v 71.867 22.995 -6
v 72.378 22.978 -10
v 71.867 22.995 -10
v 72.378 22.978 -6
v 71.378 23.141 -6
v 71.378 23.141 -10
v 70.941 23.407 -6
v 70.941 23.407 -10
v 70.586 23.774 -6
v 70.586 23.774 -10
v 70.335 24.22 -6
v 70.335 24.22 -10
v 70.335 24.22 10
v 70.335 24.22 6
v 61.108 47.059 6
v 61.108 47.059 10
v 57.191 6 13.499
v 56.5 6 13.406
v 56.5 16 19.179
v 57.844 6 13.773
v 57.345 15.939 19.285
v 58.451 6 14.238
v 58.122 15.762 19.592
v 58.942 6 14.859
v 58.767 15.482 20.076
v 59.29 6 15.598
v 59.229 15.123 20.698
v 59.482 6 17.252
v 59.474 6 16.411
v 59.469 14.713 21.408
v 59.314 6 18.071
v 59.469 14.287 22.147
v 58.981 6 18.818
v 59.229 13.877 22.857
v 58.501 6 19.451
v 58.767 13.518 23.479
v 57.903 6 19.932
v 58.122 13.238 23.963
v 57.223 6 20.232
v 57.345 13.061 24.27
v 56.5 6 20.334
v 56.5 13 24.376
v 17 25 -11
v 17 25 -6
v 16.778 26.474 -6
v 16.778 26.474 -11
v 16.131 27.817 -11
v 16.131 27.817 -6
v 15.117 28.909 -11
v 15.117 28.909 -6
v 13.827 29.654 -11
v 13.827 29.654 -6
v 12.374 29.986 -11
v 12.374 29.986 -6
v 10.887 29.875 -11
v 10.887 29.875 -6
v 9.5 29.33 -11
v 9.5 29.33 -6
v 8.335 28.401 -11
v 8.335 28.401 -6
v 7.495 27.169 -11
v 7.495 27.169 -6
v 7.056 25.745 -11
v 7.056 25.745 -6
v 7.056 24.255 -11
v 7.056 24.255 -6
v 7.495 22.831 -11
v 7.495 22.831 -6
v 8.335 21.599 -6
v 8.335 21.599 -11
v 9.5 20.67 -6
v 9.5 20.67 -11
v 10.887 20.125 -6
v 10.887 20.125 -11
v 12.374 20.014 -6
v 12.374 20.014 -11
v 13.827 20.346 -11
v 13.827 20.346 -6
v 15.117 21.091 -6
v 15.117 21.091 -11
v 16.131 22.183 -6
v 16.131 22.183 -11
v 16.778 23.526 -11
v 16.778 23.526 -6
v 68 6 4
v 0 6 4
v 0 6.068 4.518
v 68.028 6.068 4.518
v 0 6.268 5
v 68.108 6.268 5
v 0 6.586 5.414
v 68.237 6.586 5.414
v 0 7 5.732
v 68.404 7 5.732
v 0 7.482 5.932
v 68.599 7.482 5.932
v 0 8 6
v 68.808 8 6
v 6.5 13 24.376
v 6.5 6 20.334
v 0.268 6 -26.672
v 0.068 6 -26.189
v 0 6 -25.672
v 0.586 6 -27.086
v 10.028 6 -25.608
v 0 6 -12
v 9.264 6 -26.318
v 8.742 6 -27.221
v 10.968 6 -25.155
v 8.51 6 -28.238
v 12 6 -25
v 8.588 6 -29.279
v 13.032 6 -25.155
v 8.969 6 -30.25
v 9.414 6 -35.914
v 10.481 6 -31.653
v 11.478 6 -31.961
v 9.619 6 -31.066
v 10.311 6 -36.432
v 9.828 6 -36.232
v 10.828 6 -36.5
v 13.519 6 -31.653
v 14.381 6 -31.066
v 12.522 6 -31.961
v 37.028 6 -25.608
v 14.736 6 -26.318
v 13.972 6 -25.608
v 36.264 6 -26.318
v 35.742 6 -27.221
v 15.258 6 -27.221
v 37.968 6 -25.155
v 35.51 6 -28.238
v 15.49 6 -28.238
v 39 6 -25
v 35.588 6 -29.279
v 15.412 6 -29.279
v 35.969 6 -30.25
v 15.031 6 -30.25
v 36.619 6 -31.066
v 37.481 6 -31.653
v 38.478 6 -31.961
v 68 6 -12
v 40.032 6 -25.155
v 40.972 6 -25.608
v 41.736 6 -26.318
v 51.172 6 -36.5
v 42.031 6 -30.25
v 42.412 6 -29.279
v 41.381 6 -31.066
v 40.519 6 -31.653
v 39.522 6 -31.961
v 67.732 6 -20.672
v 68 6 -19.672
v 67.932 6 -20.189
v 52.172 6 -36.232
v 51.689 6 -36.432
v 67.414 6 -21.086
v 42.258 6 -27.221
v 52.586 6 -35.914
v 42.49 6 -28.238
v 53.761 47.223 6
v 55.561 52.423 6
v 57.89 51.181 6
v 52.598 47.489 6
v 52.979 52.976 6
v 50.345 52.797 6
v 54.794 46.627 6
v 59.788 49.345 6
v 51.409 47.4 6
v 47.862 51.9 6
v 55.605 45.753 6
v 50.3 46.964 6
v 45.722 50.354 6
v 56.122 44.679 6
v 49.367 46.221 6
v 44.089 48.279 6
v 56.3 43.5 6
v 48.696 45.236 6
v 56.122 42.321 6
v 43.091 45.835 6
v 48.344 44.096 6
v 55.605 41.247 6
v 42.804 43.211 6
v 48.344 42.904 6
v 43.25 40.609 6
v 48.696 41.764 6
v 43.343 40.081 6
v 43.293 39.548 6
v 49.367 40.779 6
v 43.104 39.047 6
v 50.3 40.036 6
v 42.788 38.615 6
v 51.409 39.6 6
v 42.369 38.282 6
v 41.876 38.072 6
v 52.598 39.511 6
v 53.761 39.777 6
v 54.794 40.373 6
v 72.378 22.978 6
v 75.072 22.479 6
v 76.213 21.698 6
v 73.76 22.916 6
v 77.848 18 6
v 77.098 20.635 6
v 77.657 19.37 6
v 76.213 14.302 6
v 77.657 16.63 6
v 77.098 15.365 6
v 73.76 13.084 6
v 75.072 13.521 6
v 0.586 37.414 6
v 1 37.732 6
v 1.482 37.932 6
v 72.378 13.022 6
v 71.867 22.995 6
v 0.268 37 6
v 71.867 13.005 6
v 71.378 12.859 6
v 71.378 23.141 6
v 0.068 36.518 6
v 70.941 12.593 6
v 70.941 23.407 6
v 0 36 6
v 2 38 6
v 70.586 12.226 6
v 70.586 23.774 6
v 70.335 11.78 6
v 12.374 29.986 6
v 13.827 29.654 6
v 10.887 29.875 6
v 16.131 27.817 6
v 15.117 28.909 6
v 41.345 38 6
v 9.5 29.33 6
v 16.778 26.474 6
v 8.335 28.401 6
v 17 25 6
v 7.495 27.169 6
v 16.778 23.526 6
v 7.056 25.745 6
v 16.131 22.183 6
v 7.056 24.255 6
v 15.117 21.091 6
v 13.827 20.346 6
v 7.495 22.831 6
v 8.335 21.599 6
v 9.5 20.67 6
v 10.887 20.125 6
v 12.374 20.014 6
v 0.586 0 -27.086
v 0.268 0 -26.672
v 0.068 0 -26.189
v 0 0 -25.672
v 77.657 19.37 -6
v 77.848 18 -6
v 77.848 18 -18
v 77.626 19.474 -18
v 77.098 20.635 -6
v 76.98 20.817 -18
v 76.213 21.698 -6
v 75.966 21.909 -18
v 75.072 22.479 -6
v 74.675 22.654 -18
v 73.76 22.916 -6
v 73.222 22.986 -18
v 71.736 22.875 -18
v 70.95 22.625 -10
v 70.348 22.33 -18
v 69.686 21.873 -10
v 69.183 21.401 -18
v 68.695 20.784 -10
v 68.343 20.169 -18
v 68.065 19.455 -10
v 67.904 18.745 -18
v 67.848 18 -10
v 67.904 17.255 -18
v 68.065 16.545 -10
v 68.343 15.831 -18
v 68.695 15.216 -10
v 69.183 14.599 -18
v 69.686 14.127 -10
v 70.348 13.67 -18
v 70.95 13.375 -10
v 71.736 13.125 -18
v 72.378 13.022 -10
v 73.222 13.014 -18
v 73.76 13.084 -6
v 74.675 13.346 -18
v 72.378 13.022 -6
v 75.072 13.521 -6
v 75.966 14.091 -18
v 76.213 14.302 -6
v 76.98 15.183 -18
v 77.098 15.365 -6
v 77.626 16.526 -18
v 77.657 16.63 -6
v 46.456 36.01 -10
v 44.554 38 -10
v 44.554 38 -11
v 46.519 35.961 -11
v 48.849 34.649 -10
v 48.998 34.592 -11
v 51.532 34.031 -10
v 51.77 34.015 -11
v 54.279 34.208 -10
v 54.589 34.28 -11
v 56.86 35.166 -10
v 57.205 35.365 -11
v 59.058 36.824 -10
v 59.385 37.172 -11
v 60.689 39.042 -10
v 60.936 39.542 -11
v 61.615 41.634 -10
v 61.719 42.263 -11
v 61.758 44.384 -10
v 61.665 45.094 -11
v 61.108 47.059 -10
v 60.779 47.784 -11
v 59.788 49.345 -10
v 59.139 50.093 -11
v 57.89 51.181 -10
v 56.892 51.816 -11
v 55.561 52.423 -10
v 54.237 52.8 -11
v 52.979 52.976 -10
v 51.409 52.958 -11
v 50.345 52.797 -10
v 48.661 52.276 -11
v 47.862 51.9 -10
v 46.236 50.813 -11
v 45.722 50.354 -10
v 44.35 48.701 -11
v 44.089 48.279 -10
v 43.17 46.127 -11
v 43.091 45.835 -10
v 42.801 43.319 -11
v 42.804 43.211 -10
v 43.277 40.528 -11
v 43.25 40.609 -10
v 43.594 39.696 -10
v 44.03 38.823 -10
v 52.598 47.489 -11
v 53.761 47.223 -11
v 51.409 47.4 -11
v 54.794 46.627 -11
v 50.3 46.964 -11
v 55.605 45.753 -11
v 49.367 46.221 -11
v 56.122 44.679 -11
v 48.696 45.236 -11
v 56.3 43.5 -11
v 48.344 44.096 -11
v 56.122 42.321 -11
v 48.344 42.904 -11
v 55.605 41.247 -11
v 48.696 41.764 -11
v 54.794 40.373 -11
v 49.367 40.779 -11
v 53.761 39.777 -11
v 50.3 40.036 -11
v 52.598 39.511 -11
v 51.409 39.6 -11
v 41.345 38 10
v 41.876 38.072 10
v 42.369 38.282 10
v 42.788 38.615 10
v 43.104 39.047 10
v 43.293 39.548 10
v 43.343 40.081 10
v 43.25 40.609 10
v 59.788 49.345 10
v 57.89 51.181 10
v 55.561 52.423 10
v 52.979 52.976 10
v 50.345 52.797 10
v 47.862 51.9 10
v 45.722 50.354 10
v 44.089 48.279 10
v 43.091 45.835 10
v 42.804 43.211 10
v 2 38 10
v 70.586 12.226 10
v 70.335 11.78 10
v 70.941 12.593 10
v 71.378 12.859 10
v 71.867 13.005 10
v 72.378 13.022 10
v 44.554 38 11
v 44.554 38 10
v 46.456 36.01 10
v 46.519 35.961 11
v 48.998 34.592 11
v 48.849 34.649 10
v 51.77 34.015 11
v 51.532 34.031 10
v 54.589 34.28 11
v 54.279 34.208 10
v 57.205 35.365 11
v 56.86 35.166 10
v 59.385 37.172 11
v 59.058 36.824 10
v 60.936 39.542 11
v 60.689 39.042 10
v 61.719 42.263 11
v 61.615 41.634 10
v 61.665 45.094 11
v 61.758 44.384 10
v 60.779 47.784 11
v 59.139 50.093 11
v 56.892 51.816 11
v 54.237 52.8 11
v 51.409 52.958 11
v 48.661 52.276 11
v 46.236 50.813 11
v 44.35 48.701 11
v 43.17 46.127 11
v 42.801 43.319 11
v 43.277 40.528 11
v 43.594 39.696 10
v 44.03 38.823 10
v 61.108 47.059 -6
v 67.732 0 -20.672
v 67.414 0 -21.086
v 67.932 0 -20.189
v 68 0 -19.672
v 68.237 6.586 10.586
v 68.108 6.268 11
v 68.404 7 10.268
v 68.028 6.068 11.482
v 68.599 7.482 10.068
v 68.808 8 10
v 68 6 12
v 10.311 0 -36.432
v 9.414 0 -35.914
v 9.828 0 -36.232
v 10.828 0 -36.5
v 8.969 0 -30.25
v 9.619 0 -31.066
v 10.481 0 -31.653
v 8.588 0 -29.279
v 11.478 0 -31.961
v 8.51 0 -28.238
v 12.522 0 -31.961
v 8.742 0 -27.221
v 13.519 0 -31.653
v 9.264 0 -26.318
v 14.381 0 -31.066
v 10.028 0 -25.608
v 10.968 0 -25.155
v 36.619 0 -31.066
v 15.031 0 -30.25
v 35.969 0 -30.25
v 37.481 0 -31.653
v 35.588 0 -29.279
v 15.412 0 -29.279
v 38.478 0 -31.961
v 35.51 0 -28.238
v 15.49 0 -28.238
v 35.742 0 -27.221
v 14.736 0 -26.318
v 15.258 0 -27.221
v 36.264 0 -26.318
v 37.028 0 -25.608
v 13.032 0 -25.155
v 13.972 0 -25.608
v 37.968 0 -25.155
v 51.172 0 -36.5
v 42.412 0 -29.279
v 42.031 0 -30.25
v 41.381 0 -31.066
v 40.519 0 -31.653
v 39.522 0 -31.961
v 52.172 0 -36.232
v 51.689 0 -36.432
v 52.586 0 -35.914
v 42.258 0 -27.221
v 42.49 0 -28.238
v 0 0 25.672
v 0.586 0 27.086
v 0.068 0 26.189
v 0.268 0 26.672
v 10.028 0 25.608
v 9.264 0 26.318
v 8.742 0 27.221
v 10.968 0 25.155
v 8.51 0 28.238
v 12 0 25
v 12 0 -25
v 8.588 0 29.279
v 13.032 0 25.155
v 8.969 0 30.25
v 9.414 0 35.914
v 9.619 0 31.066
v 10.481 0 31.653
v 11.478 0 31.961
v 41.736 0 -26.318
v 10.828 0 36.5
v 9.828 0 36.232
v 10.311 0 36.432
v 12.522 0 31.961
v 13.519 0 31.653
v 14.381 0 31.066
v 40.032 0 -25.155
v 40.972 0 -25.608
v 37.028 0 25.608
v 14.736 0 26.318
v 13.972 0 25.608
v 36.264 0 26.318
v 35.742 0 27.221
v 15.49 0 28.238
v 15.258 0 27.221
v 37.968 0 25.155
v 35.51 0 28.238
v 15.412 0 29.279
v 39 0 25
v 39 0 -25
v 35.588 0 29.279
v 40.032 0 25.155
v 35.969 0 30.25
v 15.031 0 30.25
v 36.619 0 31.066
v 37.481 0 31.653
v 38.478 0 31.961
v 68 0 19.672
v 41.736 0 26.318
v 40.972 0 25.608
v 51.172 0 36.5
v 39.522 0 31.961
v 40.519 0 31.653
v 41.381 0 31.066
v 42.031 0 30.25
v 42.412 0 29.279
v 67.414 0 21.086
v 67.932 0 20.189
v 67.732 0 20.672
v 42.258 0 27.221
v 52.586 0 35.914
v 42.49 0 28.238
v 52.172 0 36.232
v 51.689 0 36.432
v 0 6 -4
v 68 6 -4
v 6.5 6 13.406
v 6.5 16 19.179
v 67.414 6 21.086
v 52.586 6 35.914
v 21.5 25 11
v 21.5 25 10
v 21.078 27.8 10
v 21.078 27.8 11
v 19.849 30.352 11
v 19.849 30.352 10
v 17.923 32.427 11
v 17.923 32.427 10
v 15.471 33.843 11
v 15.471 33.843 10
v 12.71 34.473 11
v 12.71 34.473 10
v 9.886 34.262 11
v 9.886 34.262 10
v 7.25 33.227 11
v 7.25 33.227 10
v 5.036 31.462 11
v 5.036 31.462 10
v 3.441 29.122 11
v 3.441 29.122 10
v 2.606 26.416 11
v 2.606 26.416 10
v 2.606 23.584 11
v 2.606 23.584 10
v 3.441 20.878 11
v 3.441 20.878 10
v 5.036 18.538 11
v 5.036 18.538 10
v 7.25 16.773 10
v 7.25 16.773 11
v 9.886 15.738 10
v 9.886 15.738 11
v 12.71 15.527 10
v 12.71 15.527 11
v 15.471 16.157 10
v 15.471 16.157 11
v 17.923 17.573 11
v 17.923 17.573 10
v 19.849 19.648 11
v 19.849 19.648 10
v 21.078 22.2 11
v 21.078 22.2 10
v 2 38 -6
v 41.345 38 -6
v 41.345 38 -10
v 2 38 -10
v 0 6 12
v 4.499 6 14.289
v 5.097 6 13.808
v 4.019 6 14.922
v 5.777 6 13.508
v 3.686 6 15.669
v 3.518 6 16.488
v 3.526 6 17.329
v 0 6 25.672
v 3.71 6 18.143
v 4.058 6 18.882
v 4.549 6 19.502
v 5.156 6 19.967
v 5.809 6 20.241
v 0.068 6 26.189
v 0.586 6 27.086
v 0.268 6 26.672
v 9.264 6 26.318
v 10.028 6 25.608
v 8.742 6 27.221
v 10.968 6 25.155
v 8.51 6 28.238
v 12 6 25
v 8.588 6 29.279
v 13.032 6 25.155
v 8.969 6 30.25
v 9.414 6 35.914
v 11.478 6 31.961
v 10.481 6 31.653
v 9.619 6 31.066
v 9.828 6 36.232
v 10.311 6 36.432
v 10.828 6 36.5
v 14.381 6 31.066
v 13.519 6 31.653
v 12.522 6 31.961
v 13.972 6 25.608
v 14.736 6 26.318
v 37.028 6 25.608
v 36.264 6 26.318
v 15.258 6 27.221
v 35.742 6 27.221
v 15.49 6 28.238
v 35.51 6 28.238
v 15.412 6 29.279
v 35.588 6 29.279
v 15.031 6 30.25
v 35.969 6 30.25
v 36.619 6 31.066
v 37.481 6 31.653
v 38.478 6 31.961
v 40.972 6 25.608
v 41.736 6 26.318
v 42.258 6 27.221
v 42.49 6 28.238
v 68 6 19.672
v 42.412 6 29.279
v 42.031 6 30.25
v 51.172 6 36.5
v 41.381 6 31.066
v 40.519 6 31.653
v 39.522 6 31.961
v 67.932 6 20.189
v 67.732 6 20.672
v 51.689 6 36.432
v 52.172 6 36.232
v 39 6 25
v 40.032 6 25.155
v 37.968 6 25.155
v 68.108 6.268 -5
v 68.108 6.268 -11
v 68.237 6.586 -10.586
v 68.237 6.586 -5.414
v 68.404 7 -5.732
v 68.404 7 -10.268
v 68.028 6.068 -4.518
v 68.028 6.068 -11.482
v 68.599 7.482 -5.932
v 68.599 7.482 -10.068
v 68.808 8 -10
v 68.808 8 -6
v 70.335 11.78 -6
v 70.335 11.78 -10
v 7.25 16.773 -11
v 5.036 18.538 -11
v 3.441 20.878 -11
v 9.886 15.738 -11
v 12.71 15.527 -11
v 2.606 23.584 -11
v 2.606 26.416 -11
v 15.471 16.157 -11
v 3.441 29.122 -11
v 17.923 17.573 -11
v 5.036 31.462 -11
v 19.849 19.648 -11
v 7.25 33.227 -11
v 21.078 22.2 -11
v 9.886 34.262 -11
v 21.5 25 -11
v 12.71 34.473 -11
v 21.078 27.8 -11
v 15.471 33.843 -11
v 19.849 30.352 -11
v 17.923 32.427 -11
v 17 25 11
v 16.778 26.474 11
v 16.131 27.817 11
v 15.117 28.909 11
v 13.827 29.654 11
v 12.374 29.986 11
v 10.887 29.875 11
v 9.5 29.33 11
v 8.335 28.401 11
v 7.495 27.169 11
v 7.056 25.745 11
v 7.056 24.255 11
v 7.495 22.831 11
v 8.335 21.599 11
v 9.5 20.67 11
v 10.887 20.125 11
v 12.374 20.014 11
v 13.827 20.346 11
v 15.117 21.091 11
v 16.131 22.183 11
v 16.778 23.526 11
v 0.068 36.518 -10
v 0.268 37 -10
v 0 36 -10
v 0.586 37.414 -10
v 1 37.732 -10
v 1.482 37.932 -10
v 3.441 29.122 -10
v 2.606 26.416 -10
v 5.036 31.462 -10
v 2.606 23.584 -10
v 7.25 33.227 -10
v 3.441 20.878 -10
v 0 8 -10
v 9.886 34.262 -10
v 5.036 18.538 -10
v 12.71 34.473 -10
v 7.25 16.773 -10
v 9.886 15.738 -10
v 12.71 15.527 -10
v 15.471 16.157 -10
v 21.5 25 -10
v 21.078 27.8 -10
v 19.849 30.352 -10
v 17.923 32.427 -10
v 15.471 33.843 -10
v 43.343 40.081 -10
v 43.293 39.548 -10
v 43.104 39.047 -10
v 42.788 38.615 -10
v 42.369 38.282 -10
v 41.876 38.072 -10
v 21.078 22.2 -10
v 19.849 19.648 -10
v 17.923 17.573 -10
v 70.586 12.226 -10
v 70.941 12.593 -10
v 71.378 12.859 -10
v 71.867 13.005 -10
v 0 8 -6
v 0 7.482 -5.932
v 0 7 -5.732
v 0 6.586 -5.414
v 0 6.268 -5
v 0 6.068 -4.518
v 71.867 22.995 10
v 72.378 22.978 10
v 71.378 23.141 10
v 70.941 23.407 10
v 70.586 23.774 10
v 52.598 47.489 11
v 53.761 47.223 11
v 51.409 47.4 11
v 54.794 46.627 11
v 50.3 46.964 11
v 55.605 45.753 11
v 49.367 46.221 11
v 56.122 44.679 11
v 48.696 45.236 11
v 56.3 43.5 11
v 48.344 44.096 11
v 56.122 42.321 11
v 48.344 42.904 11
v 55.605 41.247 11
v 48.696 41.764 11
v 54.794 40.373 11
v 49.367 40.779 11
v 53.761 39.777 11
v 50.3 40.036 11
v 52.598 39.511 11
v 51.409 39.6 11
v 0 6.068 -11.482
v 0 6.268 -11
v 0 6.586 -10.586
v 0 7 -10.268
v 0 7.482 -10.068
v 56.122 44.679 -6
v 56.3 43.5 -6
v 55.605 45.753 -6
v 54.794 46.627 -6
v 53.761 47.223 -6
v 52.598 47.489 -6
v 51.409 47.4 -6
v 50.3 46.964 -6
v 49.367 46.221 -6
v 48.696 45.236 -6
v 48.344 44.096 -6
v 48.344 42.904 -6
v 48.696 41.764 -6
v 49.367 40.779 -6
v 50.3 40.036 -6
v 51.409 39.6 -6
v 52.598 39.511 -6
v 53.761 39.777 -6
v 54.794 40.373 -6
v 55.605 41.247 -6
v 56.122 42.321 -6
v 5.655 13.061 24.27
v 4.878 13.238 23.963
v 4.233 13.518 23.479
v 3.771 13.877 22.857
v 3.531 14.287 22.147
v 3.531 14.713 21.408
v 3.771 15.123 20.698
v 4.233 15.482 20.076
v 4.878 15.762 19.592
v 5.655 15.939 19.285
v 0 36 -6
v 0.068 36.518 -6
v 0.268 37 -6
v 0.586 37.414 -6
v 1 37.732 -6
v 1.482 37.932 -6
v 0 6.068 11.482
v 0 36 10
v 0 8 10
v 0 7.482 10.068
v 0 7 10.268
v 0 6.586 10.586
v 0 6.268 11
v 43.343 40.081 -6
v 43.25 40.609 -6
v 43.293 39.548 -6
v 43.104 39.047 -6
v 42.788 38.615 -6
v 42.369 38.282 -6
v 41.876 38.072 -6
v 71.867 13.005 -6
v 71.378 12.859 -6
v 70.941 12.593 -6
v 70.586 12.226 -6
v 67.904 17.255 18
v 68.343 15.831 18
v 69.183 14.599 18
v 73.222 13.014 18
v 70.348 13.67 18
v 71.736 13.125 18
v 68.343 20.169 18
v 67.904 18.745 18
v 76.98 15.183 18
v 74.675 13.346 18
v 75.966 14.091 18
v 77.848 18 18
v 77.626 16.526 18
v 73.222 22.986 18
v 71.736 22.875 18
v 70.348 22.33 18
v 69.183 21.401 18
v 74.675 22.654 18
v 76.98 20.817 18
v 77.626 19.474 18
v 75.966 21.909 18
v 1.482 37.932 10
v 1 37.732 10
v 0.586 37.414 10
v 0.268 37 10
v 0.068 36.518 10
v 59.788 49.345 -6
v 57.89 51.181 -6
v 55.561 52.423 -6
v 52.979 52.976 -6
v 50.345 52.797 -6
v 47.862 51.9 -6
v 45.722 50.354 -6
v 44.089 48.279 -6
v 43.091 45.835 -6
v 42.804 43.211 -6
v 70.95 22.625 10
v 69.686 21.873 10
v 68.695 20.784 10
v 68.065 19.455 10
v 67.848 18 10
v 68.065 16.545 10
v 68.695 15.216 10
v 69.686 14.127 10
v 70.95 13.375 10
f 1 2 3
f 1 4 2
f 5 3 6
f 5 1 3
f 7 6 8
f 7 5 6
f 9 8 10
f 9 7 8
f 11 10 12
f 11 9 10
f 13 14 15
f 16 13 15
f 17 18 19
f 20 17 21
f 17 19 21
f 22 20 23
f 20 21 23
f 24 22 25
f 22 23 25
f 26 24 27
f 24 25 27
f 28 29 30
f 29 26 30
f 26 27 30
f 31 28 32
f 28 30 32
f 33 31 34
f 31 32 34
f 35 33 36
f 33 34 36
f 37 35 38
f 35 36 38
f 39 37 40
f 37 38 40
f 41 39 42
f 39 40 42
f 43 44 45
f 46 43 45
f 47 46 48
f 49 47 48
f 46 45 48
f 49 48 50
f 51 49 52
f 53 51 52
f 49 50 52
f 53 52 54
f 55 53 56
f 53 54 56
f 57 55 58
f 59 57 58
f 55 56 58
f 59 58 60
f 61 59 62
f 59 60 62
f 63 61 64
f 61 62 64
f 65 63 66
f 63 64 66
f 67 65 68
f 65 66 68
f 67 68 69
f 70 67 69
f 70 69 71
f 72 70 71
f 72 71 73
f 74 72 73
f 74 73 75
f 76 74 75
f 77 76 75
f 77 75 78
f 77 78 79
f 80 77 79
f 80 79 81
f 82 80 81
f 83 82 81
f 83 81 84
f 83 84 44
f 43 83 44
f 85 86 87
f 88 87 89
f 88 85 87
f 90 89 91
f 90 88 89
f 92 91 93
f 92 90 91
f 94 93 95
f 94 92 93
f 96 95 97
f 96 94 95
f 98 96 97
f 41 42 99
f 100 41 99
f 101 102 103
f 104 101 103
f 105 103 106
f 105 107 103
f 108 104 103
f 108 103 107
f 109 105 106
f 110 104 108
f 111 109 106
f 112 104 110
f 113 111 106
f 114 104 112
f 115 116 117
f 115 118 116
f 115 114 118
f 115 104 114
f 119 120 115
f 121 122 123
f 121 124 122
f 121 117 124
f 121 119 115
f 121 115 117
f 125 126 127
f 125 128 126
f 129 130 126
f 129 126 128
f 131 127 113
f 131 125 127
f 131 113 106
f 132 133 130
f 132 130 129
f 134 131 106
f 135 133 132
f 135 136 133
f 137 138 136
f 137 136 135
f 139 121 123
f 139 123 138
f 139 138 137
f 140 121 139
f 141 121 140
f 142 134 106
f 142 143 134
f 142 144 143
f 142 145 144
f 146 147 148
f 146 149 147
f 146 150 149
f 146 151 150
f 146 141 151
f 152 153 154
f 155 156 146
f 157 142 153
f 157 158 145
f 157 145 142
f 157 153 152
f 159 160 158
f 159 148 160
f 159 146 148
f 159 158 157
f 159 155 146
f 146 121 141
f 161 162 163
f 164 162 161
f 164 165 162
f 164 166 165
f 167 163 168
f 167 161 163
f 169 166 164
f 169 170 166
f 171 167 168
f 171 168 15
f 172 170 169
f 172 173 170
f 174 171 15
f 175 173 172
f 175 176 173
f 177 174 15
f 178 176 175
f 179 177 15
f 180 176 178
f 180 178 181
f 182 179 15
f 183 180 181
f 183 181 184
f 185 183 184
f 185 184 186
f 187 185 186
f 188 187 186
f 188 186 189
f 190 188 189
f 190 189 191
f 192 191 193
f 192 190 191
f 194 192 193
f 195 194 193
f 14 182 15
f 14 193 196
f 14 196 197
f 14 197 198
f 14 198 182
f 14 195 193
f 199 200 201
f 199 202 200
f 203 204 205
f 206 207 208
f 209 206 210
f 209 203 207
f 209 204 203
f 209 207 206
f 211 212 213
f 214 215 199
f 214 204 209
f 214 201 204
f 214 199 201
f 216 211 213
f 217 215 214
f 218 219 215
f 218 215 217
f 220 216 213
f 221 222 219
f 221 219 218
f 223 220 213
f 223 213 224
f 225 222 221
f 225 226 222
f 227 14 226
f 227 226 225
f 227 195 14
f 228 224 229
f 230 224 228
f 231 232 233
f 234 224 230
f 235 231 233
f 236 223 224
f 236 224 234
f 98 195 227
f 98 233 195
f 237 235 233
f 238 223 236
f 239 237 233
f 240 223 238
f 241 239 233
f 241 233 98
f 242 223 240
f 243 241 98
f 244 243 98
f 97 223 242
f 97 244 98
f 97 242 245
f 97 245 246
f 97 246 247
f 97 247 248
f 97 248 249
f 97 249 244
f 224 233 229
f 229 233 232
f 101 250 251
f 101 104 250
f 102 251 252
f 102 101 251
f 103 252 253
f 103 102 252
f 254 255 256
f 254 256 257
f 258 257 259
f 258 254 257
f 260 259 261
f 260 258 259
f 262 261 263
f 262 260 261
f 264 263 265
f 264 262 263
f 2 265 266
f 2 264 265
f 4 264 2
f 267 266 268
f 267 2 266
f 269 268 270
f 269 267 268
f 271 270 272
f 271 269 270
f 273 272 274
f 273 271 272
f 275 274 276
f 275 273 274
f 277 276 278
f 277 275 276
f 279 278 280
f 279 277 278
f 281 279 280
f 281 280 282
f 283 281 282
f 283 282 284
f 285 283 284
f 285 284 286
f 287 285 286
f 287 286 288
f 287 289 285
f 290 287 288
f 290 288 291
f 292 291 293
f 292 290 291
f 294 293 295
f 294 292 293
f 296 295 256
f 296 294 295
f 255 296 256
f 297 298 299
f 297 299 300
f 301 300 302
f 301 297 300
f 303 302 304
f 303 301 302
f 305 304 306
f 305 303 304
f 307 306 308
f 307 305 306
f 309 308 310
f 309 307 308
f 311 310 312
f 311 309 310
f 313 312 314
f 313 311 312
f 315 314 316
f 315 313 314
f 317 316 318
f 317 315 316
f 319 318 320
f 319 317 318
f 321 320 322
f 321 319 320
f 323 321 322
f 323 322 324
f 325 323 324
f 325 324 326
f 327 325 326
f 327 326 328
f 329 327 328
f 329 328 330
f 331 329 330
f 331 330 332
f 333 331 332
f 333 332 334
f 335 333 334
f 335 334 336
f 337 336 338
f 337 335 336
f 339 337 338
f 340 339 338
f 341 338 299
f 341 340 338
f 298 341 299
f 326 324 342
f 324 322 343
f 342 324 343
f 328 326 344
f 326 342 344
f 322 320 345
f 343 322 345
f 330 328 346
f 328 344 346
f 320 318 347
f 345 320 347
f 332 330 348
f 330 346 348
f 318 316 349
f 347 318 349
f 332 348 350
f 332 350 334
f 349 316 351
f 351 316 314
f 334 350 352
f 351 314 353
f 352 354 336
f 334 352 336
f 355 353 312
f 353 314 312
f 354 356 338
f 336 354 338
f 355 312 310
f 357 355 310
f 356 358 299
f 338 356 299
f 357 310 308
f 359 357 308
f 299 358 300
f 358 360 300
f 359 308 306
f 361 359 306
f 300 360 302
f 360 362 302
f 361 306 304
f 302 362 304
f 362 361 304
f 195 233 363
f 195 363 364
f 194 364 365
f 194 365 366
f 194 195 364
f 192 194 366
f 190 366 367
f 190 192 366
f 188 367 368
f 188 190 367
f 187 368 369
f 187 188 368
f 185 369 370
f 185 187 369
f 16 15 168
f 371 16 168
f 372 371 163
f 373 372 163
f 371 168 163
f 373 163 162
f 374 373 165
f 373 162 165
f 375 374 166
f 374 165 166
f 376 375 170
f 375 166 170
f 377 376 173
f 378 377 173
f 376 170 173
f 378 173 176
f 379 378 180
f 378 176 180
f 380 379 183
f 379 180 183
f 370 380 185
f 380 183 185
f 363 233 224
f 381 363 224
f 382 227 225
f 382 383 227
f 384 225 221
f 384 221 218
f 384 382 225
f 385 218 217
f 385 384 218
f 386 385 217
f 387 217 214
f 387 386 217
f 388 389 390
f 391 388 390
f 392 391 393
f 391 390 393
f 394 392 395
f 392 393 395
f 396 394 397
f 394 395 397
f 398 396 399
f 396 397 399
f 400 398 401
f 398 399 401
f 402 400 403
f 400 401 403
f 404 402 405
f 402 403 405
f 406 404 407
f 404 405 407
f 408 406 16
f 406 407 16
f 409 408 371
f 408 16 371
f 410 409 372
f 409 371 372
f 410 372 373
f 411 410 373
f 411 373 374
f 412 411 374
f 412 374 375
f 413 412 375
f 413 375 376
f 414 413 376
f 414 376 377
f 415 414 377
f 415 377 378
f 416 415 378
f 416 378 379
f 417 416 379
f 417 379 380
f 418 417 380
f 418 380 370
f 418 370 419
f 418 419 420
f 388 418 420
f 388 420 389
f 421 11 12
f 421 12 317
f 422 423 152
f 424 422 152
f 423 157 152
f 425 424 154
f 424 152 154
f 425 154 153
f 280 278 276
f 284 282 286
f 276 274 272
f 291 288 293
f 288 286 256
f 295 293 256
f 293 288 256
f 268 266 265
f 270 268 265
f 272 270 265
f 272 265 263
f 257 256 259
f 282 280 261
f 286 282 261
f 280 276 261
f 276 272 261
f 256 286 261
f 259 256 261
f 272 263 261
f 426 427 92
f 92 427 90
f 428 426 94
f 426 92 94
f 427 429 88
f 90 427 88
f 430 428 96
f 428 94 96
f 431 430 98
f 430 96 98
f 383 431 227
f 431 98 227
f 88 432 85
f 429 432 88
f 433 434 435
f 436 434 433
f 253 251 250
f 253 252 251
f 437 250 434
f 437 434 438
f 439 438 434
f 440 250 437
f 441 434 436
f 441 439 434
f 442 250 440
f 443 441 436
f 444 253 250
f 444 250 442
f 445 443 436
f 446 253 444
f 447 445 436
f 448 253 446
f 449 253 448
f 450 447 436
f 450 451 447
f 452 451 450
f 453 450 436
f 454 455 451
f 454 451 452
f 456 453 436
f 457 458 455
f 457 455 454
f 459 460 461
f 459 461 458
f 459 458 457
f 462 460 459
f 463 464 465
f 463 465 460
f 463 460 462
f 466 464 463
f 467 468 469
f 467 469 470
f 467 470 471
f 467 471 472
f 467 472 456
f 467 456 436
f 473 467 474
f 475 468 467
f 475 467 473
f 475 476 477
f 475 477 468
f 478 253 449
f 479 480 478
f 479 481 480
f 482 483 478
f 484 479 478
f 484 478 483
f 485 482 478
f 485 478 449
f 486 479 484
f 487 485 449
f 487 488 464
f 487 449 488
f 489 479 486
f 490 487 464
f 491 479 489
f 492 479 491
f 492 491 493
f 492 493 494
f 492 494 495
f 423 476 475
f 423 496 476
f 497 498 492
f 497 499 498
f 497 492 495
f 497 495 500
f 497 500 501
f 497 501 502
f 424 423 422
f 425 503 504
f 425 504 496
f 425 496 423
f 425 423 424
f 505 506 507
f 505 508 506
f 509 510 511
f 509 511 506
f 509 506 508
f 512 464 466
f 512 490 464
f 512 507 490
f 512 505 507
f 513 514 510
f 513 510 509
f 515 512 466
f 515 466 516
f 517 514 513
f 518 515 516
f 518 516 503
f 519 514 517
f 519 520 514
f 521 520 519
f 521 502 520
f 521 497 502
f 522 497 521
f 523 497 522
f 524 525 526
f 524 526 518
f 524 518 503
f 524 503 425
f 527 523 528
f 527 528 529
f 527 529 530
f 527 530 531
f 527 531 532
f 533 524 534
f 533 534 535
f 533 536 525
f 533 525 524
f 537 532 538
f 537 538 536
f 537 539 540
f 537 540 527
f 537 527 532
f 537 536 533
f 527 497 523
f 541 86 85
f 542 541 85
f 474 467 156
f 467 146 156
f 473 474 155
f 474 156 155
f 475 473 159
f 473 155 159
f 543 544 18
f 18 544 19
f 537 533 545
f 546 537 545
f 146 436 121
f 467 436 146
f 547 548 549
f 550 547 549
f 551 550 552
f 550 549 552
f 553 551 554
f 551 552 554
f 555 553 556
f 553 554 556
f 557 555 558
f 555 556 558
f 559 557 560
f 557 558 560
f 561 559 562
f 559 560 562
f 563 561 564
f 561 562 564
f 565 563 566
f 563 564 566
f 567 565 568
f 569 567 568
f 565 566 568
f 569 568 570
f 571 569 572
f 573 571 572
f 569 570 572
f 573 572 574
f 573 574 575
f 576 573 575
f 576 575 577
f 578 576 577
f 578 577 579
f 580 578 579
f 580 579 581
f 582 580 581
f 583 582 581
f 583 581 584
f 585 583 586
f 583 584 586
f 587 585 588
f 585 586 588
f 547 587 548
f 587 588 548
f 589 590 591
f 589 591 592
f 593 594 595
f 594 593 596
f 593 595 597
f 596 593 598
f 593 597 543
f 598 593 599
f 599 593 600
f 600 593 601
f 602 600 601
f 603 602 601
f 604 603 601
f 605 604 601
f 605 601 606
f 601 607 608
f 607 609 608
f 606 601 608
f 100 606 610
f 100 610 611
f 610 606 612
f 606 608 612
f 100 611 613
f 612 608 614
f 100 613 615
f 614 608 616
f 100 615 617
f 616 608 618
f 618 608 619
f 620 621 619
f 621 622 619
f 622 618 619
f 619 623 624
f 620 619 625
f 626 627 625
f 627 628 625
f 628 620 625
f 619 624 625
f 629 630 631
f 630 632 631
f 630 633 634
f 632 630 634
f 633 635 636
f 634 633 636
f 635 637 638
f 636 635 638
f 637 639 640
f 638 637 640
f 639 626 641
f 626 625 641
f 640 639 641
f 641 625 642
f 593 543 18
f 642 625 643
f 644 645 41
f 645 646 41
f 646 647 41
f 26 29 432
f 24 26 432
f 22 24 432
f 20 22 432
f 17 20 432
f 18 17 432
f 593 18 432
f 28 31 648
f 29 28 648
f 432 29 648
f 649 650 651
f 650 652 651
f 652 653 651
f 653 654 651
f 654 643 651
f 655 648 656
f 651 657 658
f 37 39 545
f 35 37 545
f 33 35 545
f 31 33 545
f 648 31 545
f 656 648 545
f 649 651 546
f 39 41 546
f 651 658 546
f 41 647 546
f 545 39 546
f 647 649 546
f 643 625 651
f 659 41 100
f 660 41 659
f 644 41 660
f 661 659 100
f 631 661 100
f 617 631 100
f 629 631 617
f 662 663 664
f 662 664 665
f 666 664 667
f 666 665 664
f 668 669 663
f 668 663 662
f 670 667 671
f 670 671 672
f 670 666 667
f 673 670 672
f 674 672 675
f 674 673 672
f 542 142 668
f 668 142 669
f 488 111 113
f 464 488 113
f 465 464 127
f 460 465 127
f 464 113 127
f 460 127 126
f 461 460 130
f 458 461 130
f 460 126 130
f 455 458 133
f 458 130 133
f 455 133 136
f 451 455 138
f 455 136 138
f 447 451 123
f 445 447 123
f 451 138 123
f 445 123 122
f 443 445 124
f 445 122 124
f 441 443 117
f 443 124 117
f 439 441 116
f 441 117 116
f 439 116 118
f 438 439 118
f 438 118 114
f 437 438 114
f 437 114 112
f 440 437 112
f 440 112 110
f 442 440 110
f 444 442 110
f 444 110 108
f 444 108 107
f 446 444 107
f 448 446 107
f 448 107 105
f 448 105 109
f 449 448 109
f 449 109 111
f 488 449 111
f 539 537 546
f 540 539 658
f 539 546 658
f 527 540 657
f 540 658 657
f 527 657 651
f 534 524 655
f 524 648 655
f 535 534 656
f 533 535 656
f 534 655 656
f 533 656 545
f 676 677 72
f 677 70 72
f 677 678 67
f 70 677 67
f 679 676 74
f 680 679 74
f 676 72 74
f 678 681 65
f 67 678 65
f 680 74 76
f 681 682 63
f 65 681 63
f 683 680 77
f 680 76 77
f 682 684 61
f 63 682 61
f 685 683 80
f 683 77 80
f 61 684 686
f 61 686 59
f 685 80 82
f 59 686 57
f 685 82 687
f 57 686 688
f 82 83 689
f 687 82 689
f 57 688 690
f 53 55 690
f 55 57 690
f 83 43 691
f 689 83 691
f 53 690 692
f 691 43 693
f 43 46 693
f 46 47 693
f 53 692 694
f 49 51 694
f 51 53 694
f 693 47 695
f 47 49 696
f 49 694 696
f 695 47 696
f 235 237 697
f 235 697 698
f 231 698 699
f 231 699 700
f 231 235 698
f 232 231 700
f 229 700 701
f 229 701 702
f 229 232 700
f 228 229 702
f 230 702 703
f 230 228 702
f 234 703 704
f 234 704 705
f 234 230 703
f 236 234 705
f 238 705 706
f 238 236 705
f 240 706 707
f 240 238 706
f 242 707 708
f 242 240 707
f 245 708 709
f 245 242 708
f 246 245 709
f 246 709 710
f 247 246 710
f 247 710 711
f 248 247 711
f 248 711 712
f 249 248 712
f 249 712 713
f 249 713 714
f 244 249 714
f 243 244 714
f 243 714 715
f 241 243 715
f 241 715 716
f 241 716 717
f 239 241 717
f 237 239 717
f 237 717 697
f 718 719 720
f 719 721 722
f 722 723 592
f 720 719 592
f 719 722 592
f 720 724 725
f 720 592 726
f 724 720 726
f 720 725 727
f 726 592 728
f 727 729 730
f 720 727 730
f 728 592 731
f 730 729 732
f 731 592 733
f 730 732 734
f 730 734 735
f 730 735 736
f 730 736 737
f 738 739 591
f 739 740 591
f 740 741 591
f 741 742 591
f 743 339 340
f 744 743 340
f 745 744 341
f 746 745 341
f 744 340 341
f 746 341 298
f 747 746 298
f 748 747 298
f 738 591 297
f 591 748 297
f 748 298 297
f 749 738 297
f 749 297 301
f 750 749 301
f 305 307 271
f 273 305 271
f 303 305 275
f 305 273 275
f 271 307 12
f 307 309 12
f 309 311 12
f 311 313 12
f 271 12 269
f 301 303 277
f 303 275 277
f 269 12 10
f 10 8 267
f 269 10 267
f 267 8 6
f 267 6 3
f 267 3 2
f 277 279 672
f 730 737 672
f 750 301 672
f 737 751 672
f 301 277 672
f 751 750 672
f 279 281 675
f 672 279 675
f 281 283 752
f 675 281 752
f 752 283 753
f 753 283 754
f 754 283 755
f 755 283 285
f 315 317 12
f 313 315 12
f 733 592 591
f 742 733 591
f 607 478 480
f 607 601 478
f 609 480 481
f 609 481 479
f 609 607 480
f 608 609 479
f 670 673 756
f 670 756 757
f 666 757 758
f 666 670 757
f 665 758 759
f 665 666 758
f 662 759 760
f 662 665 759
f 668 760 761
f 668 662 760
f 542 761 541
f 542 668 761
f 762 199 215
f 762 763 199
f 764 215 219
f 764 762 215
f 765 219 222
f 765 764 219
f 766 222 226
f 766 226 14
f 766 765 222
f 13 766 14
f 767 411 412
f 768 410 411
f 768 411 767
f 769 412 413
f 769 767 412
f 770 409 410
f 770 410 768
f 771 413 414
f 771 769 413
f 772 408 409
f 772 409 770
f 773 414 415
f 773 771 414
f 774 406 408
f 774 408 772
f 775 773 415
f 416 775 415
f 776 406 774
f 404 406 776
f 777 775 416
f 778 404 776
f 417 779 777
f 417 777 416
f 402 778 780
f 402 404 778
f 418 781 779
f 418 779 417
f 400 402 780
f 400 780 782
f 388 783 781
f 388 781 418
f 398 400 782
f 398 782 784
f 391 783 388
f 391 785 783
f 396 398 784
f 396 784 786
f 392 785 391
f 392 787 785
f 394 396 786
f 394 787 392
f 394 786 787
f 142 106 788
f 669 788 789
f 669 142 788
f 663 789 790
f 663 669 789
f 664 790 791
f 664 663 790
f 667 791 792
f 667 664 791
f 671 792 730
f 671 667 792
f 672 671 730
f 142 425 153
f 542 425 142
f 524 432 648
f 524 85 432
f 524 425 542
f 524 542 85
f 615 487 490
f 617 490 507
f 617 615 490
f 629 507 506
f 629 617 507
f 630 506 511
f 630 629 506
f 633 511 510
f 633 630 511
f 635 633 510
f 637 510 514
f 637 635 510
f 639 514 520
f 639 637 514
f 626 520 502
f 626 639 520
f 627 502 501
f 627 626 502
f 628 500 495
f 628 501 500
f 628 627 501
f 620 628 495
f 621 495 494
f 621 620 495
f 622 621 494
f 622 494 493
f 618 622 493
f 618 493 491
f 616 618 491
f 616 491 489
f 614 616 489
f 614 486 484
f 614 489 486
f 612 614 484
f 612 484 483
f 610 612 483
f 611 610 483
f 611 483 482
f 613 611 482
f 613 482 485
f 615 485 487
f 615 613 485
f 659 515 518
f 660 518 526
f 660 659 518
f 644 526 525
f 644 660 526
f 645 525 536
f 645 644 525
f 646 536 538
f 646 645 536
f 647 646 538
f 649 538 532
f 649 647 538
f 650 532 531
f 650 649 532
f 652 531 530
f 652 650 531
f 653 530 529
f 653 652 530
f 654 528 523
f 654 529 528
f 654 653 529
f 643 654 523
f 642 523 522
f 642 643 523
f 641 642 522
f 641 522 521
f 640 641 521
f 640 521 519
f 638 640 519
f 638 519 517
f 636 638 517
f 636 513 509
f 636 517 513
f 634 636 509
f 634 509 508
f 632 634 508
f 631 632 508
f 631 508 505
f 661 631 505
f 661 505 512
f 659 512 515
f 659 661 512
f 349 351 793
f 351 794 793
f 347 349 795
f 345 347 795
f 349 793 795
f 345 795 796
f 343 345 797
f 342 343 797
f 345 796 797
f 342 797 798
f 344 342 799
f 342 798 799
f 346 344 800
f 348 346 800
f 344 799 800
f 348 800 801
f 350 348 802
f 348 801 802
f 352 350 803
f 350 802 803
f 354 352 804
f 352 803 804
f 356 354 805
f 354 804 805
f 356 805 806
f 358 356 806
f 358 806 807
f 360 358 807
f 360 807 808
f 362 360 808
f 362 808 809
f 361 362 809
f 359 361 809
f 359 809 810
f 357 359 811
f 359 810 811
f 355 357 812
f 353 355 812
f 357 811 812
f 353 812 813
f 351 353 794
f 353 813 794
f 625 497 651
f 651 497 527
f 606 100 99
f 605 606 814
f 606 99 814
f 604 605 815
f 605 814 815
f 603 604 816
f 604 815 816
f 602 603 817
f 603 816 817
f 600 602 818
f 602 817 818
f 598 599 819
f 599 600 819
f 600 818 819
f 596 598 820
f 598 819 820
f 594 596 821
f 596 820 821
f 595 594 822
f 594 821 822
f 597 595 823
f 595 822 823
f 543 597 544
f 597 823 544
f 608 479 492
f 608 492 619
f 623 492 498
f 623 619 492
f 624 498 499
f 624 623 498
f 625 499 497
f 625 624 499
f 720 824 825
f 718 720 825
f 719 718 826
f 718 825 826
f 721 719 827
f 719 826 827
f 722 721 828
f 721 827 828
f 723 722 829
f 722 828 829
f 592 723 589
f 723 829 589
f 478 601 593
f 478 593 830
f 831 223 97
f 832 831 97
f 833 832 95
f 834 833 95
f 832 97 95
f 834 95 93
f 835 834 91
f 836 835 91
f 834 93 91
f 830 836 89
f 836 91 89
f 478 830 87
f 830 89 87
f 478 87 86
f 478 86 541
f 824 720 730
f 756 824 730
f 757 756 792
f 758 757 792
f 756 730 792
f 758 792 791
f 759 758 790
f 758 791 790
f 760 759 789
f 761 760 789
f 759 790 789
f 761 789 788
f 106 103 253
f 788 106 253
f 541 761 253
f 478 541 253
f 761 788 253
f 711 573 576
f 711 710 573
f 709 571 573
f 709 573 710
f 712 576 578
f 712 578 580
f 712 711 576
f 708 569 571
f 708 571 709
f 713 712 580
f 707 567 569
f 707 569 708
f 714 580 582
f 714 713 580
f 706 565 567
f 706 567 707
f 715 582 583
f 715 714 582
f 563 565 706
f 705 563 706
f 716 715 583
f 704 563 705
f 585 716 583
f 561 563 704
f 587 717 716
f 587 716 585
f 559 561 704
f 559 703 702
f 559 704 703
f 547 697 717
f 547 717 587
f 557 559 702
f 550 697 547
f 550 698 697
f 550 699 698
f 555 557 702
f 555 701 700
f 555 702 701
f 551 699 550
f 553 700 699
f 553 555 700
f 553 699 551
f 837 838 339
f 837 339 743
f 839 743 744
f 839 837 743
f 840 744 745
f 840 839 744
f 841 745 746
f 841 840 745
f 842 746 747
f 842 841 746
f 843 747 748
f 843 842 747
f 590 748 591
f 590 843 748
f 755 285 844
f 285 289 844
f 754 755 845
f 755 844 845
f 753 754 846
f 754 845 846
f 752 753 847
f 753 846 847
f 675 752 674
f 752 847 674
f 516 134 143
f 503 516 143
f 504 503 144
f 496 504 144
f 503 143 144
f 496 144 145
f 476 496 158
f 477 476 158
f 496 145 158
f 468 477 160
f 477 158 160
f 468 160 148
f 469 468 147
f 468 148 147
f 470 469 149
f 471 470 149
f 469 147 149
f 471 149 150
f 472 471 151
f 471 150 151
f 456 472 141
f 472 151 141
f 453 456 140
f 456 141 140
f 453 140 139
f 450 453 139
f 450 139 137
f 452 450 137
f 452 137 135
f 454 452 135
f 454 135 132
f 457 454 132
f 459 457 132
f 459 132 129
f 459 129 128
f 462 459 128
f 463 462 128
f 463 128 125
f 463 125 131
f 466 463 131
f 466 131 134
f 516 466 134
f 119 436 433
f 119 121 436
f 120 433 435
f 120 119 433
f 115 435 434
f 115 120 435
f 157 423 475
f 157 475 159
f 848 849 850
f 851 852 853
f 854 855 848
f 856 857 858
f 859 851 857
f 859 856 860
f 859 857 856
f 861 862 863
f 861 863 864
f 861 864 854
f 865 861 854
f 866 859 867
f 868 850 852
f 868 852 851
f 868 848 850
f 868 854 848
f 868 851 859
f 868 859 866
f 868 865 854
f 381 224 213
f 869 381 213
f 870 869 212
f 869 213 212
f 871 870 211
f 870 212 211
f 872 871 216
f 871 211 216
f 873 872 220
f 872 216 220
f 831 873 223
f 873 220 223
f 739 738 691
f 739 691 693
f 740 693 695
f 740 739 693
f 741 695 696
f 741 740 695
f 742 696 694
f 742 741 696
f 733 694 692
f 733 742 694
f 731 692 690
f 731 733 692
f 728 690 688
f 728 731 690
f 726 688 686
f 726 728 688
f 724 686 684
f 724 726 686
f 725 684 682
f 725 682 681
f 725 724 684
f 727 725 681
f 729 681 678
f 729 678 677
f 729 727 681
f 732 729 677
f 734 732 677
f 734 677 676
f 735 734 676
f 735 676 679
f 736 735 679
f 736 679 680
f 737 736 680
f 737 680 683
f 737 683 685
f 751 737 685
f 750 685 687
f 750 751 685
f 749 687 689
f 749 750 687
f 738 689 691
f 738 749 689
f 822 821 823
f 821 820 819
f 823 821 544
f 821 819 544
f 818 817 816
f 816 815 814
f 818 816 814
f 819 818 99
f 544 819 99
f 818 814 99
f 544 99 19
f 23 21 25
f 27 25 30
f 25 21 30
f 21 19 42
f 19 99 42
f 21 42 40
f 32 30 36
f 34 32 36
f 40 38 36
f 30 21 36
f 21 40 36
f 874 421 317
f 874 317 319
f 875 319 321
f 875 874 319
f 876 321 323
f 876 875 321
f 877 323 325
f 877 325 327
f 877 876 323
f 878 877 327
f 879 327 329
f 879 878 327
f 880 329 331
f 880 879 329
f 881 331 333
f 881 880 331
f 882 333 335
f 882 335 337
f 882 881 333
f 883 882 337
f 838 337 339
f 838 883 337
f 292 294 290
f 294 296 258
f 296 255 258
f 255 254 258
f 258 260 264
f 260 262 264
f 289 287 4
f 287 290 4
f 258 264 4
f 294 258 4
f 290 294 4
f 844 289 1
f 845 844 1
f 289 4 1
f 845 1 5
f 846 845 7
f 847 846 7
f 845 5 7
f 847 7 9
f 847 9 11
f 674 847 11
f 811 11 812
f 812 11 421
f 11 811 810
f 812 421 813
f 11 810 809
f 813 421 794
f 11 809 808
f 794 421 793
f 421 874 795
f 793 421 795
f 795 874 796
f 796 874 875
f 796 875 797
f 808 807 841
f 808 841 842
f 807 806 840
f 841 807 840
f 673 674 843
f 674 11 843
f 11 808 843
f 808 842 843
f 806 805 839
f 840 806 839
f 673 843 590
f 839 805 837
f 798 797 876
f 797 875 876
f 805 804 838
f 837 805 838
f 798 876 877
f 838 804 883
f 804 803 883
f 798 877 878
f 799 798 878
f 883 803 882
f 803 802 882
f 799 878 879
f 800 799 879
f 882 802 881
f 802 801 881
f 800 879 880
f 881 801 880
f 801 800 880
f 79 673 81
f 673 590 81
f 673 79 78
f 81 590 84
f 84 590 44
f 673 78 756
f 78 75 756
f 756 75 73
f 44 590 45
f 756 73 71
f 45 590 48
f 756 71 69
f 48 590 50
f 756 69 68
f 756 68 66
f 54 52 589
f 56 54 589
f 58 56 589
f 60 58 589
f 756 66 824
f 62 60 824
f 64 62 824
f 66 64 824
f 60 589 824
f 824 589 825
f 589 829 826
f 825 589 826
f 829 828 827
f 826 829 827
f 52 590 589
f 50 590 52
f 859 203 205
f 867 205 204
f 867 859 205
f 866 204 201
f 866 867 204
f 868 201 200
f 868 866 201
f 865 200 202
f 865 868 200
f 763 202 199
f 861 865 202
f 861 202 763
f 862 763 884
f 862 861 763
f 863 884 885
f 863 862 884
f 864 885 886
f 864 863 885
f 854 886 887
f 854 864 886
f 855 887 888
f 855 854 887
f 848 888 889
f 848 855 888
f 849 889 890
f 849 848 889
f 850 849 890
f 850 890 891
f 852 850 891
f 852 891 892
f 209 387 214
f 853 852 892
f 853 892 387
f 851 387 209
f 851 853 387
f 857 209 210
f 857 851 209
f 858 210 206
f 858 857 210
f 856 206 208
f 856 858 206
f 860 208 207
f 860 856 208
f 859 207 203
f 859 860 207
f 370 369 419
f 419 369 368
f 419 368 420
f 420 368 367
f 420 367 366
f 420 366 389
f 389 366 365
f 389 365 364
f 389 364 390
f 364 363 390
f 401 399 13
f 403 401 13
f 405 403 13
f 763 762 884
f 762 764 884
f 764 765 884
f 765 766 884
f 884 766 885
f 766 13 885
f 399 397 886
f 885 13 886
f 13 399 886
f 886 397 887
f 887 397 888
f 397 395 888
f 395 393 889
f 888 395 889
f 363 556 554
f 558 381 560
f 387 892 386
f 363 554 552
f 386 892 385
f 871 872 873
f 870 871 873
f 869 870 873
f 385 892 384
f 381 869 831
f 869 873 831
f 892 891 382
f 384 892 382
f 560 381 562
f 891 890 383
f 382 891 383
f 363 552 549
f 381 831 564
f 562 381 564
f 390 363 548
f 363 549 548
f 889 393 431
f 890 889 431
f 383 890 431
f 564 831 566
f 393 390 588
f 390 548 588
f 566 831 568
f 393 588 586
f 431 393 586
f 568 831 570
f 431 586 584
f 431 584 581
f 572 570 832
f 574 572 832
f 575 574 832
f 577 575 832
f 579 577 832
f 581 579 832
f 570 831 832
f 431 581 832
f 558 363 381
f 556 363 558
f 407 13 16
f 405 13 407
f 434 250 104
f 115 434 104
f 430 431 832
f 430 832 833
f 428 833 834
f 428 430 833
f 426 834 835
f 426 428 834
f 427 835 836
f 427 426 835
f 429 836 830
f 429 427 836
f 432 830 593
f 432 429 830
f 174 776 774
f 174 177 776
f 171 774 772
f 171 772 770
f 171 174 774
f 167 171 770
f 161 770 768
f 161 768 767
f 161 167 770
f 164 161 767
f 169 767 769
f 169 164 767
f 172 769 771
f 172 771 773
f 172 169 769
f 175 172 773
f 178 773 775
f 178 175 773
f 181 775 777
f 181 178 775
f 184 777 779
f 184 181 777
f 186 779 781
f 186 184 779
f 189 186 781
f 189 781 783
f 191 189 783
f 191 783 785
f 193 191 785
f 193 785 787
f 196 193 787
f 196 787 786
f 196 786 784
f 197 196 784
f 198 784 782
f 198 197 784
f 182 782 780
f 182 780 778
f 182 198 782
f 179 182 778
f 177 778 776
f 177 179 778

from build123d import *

# Parameters (mm, degrees)
SKETCH1_W           = 68
SKETCH1_H           = 36.5
BOSS_EXTRUDE1_DEPTH = 6
SKETCH2_R           = 3.5
CUT_EXTRUDE1_DEPTH  = 78.409624725
SKETCH3_W           = 68
SKETCH3_H           = 4
BOSS_EXTRUDE2_DEPTH = 1
SKETCH4_R           = 5
SKETCH4_R_2         = 4
BOSS_EXTRUDE3_DEPTH = 4
FILLET1_R           = 2
SKETCH5_R           = 9.5
SKETCH5_R_2         = 4
SKETCH5_R_3         = 5
BOSS_EXTRUDE4_DEPTH = 1
FILLET2_R           = 2
CHAMFER1_SIZE       = 10
CHAMFER2_SIZE       = 16
FILLET3_R           = 2
SKETCH7_R           = 5
BOSS_EXTRUDE6_DEPTH = 18
SKETCH8_W           = 25
SKETCH8_H           = 25
CUT_EXTRUDE2_DEPTH  = 12
FILLET8_R           = 2
BOSS_EXTRUDE8_REACH = 99.236


with BuildPart() as part:
    # Sketch1 → Boss-Extrude1 (new body)
    with BuildSketch(Plane(origin=(0, 0, 0), x_dir=(1, 0, 0), z_dir=(0, 1, 0))):
        with Locations((34, 18.25)):
            Rectangle(SKETCH1_W, SKETCH1_H)
    boss_extrude1 = extrude(amount=BOSS_EXTRUDE1_DEPTH)

    # Sketch2 → Cut-Extrude1 (cut, through all)
    with BuildSketch(Plane(origin=(0, 6, 0), x_dir=(1, 0, 0), z_dir=(0, 1, 0))):
        with Locations(Location((12, 28.5, 0), (0, 0, 270))):
            Circle(SKETCH2_R)
        with Locations(Location((39, 28.5, 0), (0, 0, 270))):
            Circle(SKETCH2_R)
    cut_extrude1 = extrude(amount=-CUT_EXTRUDE1_DEPTH, mode=Mode.SUBTRACT)

    # Sketch3 → Boss-Extrude2 (add)
    with BuildSketch(Plane(origin=(0, 6, 0), x_dir=(1, 0, 0), z_dir=(0, 1, 0))):
        with Locations((34, 8)):
            Rectangle(SKETCH3_W, SKETCH3_H)
    boss_extrude2 = extrude(amount=BOSS_EXTRUDE2_DEPTH)

    # Sketch4 → Boss-Extrude3 (add)
    with BuildSketch(Plane.XY.offset(-6)):
        with BuildLine():
            Line((68, 6), (72.84831471, 18))
            Line((72.84831471, 18), (61.107812514, 47.058762637))
            ThreePointArc((61.107812514, 47.058762637), (47.739148723, 51.833822365), (44.553599203, 38))
            Line((44.553599203, 38), (0, 38))
            Line((0, 38), (0, 6))
            Line((0, 6), (68, 6))
        make_face()
        with Locations((12, 25)):
            Circle(SKETCH4_R, mode=Mode.SUBTRACT)
        with Locations((52.299565896, 43.5)):
            Circle(SKETCH4_R_2, mode=Mode.SUBTRACT)
    boss_extrude3 = extrude(amount=-BOSS_EXTRUDE3_DEPTH)

    # Mirror1: Boss-Extrude1, Cut-Extrude1, Boss-Extrude2, Boss-Extrude3 across plane
    add(boss_extrude1.mirror(Plane.XY))
    add(cut_extrude1.mirror(Plane.XY), mode=Mode.SUBTRACT)
    add(boss_extrude2.mirror(Plane.XY))
    add(boss_extrude3.mirror(Plane.XY))

    # Fillet1
    fillet1_edges = [part.edges().sort_by_distance(p)[0] for p in [
        (34, 6, -6),
        (34, 6, -10),
        (34, 6, 6),
        (34, 6, 10),
    ]]
    fillet(fillet1_edges, radius=FILLET1_R)

    # Sketch5 → Boss-Extrude4 (add)
    # profile 1 of 2: a face of its own
    with BuildSketch(Plane.XY.offset(10)):
        with Locations(Location((52.299565896, 43.5, 0), (0, 0, 215.376540152))):
            Circle(SKETCH5_R)
        with Locations((52.299565896, 43.5)):
            Circle(SKETCH5_R_2, mode=Mode.SUBTRACT)
    # profile 2 of 2: a face of its own
    with BuildSketch(Plane.XY.offset(10)):
        with Locations((12, 25)):
            Circle(SKETCH5_R)
        with Locations((12, 25)):
            Circle(SKETCH5_R_3, mode=Mode.SUBTRACT)
    boss_extrude4 = extrude(amount=BOSS_EXTRUDE4_DEPTH)

    # Fillet2
    # the kernel refuses this fillet: 2 mm, written as the material it adds along each edge
    with BuildSketch(Plane(origin=(44.553599203, 38, -6), x_dir=(-0.4469432732557111, 0.8945623010676621, 0), z_dir=(0, 0, -1))) as fillet2_piece_1:
        with BuildLine():
            CenterArc((3.223135148, -1.976302693), FILLET2_R, 98.828804139, 107.718931873)
            Line((1.434010546, -2.870189239), (0, 0))
            ThreePointArc((0, 0), (1.458084948, -0.112562209), (2.916169896, 0))
        make_face()
    extrude(amount=4)
    with BuildSketch(Plane(origin=(44.553599203, 38, 6), x_dir=(-0.4469432732557111, 0.8945623010676621, 0), z_dir=(0, 0, 1))) as fillet2_piece_2:
        with BuildLine():
            CenterArc((3.223135148, 1.976302693), FILLET2_R, 153.452263987, 107.718931873)
            Line((1.434010546, 2.870189239), (0, 0))
            ThreePointArc((0, 0), (1.458084948, 0.112562209), (2.916169896, 0))
        make_face()
    extrude(amount=4)
    # the kernel refuses this fillet: 2 mm, written as the material it takes off along each edge
    with BuildSketch(Plane(origin=(0, 38, -1), x_dir=(0, -1, 0), z_dir=(0, 0, -1))) as fillet2_2_piece_1:
        with BuildLine():
            CenterArc((FILLET2_R, -FILLET2_R), FILLET2_R, 90, 90)
            Line((0, -FILLET2_R), (0, 0))
            Line((0, 0), (FILLET2_R, 0))
        make_face()
    extrude(amount=14, mode=Mode.SUBTRACT)
    with BuildSketch(Plane(origin=(0, 38, 1), x_dir=(0, -1, 0), z_dir=(0, 0, 1))) as fillet2_2_piece_2:
        with BuildLine():
            CenterArc((FILLET2_R, FILLET2_R), FILLET2_R, 180, 90)
            Line((0, FILLET2_R), (0, 0))
            Line((0, 0), (FILLET2_R, 0))
        make_face()
    extrude(amount=14, mode=Mode.SUBTRACT)

    # Chamfer1
    chamfer1_edges = [part.edges().sort_by_distance(p)[0] for p in [
        (0, 3, 36.5),
        (0, 3, -36.5),
    ]]
    chamfer(chamfer1_edges, length=CHAMFER1_SIZE)

    # Chamfer2
    chamfer2_edges = [part.edges().sort_by_distance(p)[0] for p in [
        (68, 3, 36.5),
        (68, 3, -36.5),
    ]]
    chamfer(chamfer2_edges, length=CHAMFER2_SIZE)

    # Fillet3
    fillet3_edges = [part.edges().sort_by_distance(p)[0] for p in [
        (10, 3, 36.5),
        (0, 3, -26.5),
        (0, 3, 26.5),
        (10, 3, -36.5),
        (68, 3, -20.5),
        (68, 3, 20.5),
        (52, 3, 36.5),
        (52, 3, -36.5),
    ]]
    fillet(fillet3_edges, radius=FILLET3_R)

    # Mirror2: Boss-Extrude4 across plane
    add(boss_extrude4.mirror(Plane.XY))

    # Sketch7 → Boss-Extrude6 (add, symmetric)
    with BuildSketch(Plane.XY):
        with Locations((72.84831471, 18)):
            Circle(SKETCH7_R)
    extrude(amount=BOSS_EXTRUDE6_DEPTH, both=True)

    # Sketch8 → Cut-Extrude2 (cut)
    with BuildSketch(Plane(origin=(0, 0, 6), x_dir=(-1, 0, 0), z_dir=(0, 0, -1))):
        with Locations((-70.130356493, 22.5)):
            Rectangle(SKETCH8_W, SKETCH8_H)
    extrude(amount=CUT_EXTRUDE2_DEPTH, mode=Mode.SUBTRACT)

    # Fillet8
    fillet8_edges = [part.edges().sort_by_distance(p)[0] for p in [
        (70.975281743, 22.635919273, 8),
        (70.975281743, 13.364080727, -8),
        (70.975281743, 22.635919273, -8),
        (70.975281743, 13.364080727, 8),
    ]]
    fillet(fillet8_edges, radius=FILLET8_R)

    # Boss-Extrude8: up to this plane
    boss_extrude8_end = Plane(origin=(0, 6, 0), z_dir=(0, 1, 0))
    # Sketch11 → Boss-Extrude8 (add, up to the surface)
    with BuildSketch(Plane(origin=(0, 20.304963619, 11.723076211), x_dir=(-1, 0, 0), z_dir=(0, 0.866025403784438, 0.500000000000001)), mode=Mode.PRIVATE) as boss_extrude8_sk1:
        with BuildLine():
            Line((-6.5, 8.609927238), (-56.5, 8.609927238))
            ThreePointArc((-56.5, 8.609927238), (-59.5, 11.609927238), (-56.5, 14.609927238))
            Line((-56.5, 14.609927238), (-6.5, 14.609927238))
            ThreePointArc((-6.5, 14.609927238), (-3.5, 11.609927238), (-6.5, 8.609927238))
        make_face()
    boss_extrude8_tool1 = split(extrude(boss_extrude8_sk1.sketch, amount=-BOSS_EXTRUDE8_REACH, mode=Mode.PRIVATE), bisect_by=boss_extrude8_end, keep=Keep.BOTH, mode=Mode.PRIVATE)
    add(boss_extrude8_tool1.solids().sort_by_distance((31.5, 14.5, 21.777568))[0])


solid = part.part
